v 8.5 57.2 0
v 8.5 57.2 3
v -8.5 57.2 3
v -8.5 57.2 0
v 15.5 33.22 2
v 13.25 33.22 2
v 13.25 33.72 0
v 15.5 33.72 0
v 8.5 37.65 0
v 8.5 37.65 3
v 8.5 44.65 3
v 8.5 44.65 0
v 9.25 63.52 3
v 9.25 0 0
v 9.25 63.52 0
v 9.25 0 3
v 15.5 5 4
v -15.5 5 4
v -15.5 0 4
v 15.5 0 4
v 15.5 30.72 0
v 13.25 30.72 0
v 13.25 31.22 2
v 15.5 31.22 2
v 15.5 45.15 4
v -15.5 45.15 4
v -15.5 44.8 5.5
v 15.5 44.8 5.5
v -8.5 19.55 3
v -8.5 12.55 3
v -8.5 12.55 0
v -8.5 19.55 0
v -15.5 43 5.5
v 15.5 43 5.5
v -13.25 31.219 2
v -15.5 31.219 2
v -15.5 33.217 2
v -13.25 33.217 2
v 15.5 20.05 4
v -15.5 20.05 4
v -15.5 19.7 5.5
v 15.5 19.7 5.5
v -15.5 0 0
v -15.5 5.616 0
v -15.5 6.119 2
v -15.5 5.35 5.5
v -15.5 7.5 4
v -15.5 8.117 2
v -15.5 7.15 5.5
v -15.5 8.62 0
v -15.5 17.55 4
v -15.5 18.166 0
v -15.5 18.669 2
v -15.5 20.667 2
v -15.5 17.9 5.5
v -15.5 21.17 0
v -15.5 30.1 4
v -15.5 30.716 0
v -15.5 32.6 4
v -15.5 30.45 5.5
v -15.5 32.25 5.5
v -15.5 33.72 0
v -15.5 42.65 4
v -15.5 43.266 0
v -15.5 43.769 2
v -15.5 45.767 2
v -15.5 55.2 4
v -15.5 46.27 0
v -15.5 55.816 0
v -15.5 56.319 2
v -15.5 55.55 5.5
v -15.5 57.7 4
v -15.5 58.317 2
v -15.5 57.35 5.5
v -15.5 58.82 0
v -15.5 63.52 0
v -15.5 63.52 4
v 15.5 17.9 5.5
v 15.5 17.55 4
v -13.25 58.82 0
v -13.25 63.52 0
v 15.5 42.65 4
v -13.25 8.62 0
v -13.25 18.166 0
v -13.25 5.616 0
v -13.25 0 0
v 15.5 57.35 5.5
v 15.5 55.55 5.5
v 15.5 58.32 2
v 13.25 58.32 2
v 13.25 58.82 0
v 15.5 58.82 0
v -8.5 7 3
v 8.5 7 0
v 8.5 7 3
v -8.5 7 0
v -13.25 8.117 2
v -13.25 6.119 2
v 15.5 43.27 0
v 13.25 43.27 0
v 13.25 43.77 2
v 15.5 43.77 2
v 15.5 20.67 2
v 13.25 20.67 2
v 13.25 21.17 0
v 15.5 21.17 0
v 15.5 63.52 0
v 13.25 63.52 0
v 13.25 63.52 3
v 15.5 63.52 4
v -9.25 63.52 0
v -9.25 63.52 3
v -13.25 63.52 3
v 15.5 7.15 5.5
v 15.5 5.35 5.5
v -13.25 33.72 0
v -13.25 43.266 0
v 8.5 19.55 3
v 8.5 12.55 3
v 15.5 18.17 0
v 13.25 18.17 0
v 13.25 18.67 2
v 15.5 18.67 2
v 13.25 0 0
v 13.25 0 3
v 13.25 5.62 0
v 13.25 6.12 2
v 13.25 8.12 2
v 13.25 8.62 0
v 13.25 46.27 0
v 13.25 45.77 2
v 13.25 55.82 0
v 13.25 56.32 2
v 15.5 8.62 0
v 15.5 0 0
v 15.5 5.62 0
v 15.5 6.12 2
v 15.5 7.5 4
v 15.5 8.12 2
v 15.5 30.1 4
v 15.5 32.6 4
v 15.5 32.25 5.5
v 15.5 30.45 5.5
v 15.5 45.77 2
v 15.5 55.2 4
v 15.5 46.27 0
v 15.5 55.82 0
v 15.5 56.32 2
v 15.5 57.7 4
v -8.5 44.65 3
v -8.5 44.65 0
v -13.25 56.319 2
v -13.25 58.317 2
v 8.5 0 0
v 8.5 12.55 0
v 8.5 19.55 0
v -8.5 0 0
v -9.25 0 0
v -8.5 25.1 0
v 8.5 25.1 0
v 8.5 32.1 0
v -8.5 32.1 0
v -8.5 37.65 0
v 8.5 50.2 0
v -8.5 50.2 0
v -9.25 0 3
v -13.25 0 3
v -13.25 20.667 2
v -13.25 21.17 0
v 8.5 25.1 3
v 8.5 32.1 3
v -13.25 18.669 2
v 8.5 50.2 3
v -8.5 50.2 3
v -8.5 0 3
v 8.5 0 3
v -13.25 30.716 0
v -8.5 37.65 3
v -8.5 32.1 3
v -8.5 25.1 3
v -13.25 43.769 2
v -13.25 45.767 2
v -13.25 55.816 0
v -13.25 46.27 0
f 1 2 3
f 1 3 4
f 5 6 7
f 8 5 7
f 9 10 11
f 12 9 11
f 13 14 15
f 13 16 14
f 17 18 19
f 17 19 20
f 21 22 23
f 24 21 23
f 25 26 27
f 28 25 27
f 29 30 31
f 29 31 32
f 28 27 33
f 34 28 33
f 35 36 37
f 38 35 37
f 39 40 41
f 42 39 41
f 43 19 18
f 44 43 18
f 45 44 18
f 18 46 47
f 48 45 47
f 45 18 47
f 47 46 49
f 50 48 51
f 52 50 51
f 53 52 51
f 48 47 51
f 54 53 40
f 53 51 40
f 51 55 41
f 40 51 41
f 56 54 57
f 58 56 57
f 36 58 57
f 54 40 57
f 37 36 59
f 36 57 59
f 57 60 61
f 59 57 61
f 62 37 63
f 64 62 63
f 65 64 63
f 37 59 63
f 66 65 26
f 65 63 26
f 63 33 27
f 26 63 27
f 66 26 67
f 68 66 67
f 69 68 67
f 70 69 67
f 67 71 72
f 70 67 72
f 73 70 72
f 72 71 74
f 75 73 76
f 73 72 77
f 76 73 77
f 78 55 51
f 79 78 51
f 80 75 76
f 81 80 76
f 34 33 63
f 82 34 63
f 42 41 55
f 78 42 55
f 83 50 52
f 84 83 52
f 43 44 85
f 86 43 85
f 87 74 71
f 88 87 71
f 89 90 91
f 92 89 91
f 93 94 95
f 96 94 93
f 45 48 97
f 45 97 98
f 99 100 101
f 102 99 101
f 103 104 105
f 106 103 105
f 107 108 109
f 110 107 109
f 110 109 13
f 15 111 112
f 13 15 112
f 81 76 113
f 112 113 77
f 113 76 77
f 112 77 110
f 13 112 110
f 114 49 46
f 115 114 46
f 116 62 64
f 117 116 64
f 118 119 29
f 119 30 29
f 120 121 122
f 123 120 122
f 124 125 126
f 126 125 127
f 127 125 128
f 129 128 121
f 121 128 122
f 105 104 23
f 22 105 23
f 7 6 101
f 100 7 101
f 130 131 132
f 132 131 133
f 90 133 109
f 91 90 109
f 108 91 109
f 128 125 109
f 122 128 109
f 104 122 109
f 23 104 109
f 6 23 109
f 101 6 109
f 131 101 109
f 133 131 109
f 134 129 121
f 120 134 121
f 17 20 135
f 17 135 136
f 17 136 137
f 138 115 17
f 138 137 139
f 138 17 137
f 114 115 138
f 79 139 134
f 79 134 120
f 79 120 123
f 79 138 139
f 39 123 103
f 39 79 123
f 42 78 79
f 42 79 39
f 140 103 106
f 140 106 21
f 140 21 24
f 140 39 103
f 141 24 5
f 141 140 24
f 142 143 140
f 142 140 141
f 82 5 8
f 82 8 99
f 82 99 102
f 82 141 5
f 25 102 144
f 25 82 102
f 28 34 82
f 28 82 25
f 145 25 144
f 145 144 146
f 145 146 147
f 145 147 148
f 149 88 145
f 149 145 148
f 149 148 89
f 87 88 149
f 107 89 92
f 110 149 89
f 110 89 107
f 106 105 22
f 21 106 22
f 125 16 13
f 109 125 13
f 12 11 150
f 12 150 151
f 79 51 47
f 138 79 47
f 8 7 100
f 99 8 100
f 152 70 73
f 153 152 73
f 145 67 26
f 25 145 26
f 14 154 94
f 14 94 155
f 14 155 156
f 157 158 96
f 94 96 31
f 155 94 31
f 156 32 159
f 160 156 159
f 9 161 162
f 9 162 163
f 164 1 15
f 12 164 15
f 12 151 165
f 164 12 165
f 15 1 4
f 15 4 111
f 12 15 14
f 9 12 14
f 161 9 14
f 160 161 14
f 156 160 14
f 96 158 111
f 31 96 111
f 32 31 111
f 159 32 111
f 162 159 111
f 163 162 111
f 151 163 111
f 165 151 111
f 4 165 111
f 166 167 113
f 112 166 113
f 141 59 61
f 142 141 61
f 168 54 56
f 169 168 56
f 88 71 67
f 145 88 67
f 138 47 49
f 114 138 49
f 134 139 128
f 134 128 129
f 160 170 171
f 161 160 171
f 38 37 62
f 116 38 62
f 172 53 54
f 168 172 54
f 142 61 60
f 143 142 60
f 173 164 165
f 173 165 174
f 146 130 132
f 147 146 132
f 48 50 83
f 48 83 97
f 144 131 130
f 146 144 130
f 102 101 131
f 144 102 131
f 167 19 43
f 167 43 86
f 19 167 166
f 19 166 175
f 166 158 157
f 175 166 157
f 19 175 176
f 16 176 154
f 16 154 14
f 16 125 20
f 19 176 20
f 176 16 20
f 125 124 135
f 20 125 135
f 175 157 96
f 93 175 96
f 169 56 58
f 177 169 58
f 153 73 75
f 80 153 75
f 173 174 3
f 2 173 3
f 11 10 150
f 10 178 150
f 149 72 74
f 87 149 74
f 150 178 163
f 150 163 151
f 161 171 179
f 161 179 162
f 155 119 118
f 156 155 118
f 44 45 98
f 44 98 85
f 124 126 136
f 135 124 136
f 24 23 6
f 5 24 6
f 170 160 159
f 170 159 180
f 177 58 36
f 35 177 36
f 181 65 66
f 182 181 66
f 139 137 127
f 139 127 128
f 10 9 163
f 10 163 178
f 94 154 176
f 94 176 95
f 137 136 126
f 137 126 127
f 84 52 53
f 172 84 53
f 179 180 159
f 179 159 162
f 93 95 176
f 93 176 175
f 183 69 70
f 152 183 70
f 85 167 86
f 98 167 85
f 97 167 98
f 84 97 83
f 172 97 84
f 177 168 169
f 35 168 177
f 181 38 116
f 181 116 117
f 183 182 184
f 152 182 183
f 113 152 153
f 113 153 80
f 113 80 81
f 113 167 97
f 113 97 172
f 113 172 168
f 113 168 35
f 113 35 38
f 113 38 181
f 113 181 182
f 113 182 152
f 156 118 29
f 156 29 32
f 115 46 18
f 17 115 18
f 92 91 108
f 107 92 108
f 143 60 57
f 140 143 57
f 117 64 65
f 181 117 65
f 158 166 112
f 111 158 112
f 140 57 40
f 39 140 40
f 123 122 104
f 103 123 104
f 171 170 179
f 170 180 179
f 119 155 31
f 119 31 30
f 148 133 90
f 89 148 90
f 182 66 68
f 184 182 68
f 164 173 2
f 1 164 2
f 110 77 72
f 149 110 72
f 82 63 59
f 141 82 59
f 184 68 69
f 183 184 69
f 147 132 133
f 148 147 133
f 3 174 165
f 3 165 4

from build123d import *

# Parameters (mm, degrees)
SKETCH2_W                  = 34
SKETCH2_H                  = 13.32
BOSS_EXTRUDE1_DEPTH        = 4
SKETCH3_W                  = 17
SKETCH3_H                  = 7
CUT_EXTRUDE1_DEPTH         = 3
SKETCH4_W                  = 4
SKETCH4_H                  = 13.32
CUT_EXTRUDE3_DEPTH         = 3
CUT_EXTRUDE4_DEPTH         = 4
CUT_EXTRUDE5_DEPTH         = 4
BOSS_EXTRUDE2_DEPTH        = 34
SKETCH9_W                  = 1.5
SKETCH9_H                  = 13.32
CUT_EXTRUDE6_DEPTH         = 10
CRVPATTERN11_START         = -8.5
CRVPATTERN11_OUTLINE_W     = 0.77
CRVPATTERN11_OUTLINE_H     = 3
CRVPATTERN11_DEPTH         = 17
CRVPATTERN11_START_2       = -9.25
CRVPATTERN11_2_DEPTH       = 18.5
CRVPATTERN11_START_3       = -15.5
CRVPATTERN11_3_DEPTH       = 31
CRVPATTERN11_START_4       = 13.25
CRVPATTERN11_4_DEPTH       = 2.25
CRVPATTERN11_5_DEPTH       = 2.25
CRVPATTERN11_6_OUTLINE_W   = 7
CRVPATTERN11_6_OUTLINE_H   = 3
CRVPATTERN11_6_OUTLINE_W_2 = 6.23
CRVPATTERN11_6_DEPTH       = 0.75
CRVPATTERN11_START_5       = 8.5
CRVPATTERN11_7_OUTLINE_W   = 7
CRVPATTERN11_7_OUTLINE_H   = 3
CRVPATTERN11_7_OUTLINE_W_2 = 6.23
CRVPATTERN11_7_DEPTH       = 0.75


with BuildPart() as part:
    # Sketch2 → Boss-Extrude1 (new body)
    with BuildSketch(Plane.XY):
        with Locations((0, 6.66)):
            Rectangle(SKETCH2_W, SKETCH2_H)
    extrude(amount=BOSS_EXTRUDE1_DEPTH)

    # Sketch3 → Cut-Extrude1 (cut)
    with BuildSketch(Plane(origin=(0, 0, 0), x_dir=(-1, 0, 0), z_dir=(0, 0, -1))):
        with Locations((0, 3.5)):
            Rectangle(SKETCH3_W, SKETCH3_H)
    extrude(amount=-CUT_EXTRUDE1_DEPTH, mode=Mode.SUBTRACT)

    # Sketch4 → Cut-Extrude3 (cut)
    with BuildSketch(Plane(origin=(0, 0, 0), x_dir=(-1, 0, 0), z_dir=(0, 0, -1))):
        with Locations((-11.25, 6.66)):
            Rectangle(SKETCH4_W, SKETCH4_H)
        with Locations((11.25, 6.66)):
            Rectangle(SKETCH4_W, SKETCH4_H)
    extrude(amount=-CUT_EXTRUDE3_DEPTH, mode=Mode.SUBTRACT)

    # Sketch6 → Cut-Extrude4 (cut)
    with BuildSketch(Plane(origin=(17, 0, 0), x_dir=(0, 0, -1), z_dir=(1, 0, 0))):
        Polygon((0, 8.62), (0, 5.62), (-2, 6.12), (-2, 8.12), align=None)
    extrude(amount=-CUT_EXTRUDE4_DEPTH, mode=Mode.SUBTRACT)

    # Sketch7 → Cut-Extrude5 (cut)
    with BuildSketch(Plane.ZY.offset(17)):
        Polygon((0, 5.616283946), (0, 8.62), (2, 8.117101335), (2, 6.119182611), align=None)
    extrude(amount=-CUT_EXTRUDE5_DEPTH, mode=Mode.SUBTRACT)

    # Sketch8 → Boss-Extrude2 (add)
    with BuildSketch(Plane.ZY.offset(17)):
        Polygon((4, 5), (4, 7.5), (5.5, 7.15), (5.5, 5.35), align=None)
    extrude(amount=-BOSS_EXTRUDE2_DEPTH)

    # Sketch9 → Cut-Extrude6 (cut)
    with BuildSketch(Plane(origin=(0, 0, 0), x_dir=(-1, 0, 0), z_dir=(0, 0, -1))):
        with Locations((-16.25, 6.66)):
            Rectangle(SKETCH9_W, SKETCH9_H)
        with Locations((16.25, 6.66)):
            Rectangle(SKETCH9_W, SKETCH9_H)
    extrude(amount=-CUT_EXTRUDE6_DEPTH, mode=Mode.SUBTRACT)

    # CrvPattern11: read off the stored shape, not the designer's step
    # CrvPattern11 outline → CrvPattern11 (cut)
    with BuildSketch(Plane.YZ.offset(CRVPATTERN11_START)):
        with Locations((12.935, 1.5)):
            Rectangle(CRVPATTERN11_OUTLINE_W, CRVPATTERN11_OUTLINE_H)
    extrude(amount=CRVPATTERN11_DEPTH, mode=Mode.SUBTRACT)

    # CrvPattern11 2 outline → CrvPattern11 2 (add)
    with BuildSketch(Plane.YZ.offset(CRVPATTERN11_START_2)):
        Polygon((55.2, 4), (45.15, 4), (44.8, 5.5), (43, 5.5), (42.65, 4), (32.6, 4), (32.25, 5.5), (30.45, 5.5), (30.1, 4), (20.05, 4), (19.7, 5.5), (17.9, 5.5), (17.55, 4), (13.32, 4), (13.32, 3), (19.55, 3), (19.55, 0), (25.1, 0), (25.1, 3), (32.1, 3), (32.1, 0), (37.65, 0), (37.65, 3), (44.65, 3), (44.65, 0), (50.2, 0), (50.2, 3), (57.2, 3), (57.2, 0), (63.52, 0), (63.52, 4), (57.7, 4), (57.35, 5.5), (55.55, 5.5), align=None)
    extrude(amount=CRVPATTERN11_2_DEPTH)

    # CrvPattern11 3 outline → CrvPattern11 3 (add)
    with BuildSketch(Plane.YZ.offset(CRVPATTERN11_START_3)):
        Polygon((55.2, 4), (45.15, 4), (44.8, 5.5), (43, 5.5), (42.65, 4), (32.6, 4), (32.25, 5.5), (30.45, 5.5), (30.1, 4), (20.05, 4), (19.7, 5.5), (17.9, 5.5), (17.55, 4), (13.32, 4), (13.32, 3), (63.52, 3), (63.52, 4), (57.7, 4), (57.35, 5.5), (55.55, 5.5), align=None)
    extrude(amount=CRVPATTERN11_3_DEPTH)

    # CrvPattern11 4 outline → CrvPattern11 4 (add)
    with BuildSketch(Plane.YZ.offset(CRVPATTERN11_START_4)):
        Polygon((63.52, 0), (63.52, 3), (13.32, 3), (13.32, 0), (18.17, 0), (18.67, 2), (20.67, 2), (21.17, 0), (30.72, 0), (31.22, 2), (33.22, 2), (33.72, 0), (43.27, 0), (43.77, 2), (45.77, 2), (46.27, 0), (55.82, 0), (56.32, 2), (58.32, 2), (58.82, 0), align=None)
    extrude(amount=CRVPATTERN11_4_DEPTH)

    # CrvPattern11 5 outline → CrvPattern11 5 (add)
    with BuildSketch(Plane.YZ.offset(CRVPATTERN11_START_3)):
        Polygon((63.52, 0), (63.52, 3), (13.32, 3), (13.32, 0), (18.166283946, 0), (18.669182611, 2), (20.667101335, 2), (21.17, 0), (30.716283946, 0), (31.219182611, 2), (33.217101335, 2), (33.72, 0), (43.266283946, 0), (43.769182611, 2), (45.767101335, 2), (46.27, 0), (55.816283946, 0), (56.319182611, 2), (58.317101335, 2), (58.82, 0), align=None)
    extrude(amount=CRVPATTERN11_5_DEPTH)

    # CrvPattern11 6 outline → CrvPattern11 6 (add)
    with BuildSketch(Plane.YZ.offset(CRVPATTERN11_START_2)):
        with Locations((53.7, 1.5)):
            Rectangle(CRVPATTERN11_6_OUTLINE_W, CRVPATTERN11_6_OUTLINE_H)
        with Locations((41.15, 1.5)):
            Rectangle(CRVPATTERN11_6_OUTLINE_W, CRVPATTERN11_6_OUTLINE_H)
        with Locations((28.6, 1.5)):
            Rectangle(CRVPATTERN11_6_OUTLINE_W, CRVPATTERN11_6_OUTLINE_H)
        with Locations((16.435, 1.5)):
            Rectangle(CRVPATTERN11_6_OUTLINE_W_2, CRVPATTERN11_6_OUTLINE_H)
    extrude(amount=CRVPATTERN11_6_DEPTH)

    # CrvPattern11 7 outline → CrvPattern11 7 (add)
    with BuildSketch(Plane.YZ.offset(CRVPATTERN11_START_5)):
        with Locations((53.7, 1.5)):
            Rectangle(CRVPATTERN11_7_OUTLINE_W, CRVPATTERN11_7_OUTLINE_H)
        with Locations((41.15, 1.5)):
            Rectangle(CRVPATTERN11_7_OUTLINE_W, CRVPATTERN11_7_OUTLINE_H)
        with Locations((28.6, 1.5)):
            Rectangle(CRVPATTERN11_7_OUTLINE_W, CRVPATTERN11_7_OUTLINE_H)
        with Locations((16.435, 1.5)):
            Rectangle(CRVPATTERN11_7_OUTLINE_W_2, CRVPATTERN11_7_OUTLINE_H)
    extrude(amount=CRVPATTERN11_7_DEPTH)


solid = part.part
